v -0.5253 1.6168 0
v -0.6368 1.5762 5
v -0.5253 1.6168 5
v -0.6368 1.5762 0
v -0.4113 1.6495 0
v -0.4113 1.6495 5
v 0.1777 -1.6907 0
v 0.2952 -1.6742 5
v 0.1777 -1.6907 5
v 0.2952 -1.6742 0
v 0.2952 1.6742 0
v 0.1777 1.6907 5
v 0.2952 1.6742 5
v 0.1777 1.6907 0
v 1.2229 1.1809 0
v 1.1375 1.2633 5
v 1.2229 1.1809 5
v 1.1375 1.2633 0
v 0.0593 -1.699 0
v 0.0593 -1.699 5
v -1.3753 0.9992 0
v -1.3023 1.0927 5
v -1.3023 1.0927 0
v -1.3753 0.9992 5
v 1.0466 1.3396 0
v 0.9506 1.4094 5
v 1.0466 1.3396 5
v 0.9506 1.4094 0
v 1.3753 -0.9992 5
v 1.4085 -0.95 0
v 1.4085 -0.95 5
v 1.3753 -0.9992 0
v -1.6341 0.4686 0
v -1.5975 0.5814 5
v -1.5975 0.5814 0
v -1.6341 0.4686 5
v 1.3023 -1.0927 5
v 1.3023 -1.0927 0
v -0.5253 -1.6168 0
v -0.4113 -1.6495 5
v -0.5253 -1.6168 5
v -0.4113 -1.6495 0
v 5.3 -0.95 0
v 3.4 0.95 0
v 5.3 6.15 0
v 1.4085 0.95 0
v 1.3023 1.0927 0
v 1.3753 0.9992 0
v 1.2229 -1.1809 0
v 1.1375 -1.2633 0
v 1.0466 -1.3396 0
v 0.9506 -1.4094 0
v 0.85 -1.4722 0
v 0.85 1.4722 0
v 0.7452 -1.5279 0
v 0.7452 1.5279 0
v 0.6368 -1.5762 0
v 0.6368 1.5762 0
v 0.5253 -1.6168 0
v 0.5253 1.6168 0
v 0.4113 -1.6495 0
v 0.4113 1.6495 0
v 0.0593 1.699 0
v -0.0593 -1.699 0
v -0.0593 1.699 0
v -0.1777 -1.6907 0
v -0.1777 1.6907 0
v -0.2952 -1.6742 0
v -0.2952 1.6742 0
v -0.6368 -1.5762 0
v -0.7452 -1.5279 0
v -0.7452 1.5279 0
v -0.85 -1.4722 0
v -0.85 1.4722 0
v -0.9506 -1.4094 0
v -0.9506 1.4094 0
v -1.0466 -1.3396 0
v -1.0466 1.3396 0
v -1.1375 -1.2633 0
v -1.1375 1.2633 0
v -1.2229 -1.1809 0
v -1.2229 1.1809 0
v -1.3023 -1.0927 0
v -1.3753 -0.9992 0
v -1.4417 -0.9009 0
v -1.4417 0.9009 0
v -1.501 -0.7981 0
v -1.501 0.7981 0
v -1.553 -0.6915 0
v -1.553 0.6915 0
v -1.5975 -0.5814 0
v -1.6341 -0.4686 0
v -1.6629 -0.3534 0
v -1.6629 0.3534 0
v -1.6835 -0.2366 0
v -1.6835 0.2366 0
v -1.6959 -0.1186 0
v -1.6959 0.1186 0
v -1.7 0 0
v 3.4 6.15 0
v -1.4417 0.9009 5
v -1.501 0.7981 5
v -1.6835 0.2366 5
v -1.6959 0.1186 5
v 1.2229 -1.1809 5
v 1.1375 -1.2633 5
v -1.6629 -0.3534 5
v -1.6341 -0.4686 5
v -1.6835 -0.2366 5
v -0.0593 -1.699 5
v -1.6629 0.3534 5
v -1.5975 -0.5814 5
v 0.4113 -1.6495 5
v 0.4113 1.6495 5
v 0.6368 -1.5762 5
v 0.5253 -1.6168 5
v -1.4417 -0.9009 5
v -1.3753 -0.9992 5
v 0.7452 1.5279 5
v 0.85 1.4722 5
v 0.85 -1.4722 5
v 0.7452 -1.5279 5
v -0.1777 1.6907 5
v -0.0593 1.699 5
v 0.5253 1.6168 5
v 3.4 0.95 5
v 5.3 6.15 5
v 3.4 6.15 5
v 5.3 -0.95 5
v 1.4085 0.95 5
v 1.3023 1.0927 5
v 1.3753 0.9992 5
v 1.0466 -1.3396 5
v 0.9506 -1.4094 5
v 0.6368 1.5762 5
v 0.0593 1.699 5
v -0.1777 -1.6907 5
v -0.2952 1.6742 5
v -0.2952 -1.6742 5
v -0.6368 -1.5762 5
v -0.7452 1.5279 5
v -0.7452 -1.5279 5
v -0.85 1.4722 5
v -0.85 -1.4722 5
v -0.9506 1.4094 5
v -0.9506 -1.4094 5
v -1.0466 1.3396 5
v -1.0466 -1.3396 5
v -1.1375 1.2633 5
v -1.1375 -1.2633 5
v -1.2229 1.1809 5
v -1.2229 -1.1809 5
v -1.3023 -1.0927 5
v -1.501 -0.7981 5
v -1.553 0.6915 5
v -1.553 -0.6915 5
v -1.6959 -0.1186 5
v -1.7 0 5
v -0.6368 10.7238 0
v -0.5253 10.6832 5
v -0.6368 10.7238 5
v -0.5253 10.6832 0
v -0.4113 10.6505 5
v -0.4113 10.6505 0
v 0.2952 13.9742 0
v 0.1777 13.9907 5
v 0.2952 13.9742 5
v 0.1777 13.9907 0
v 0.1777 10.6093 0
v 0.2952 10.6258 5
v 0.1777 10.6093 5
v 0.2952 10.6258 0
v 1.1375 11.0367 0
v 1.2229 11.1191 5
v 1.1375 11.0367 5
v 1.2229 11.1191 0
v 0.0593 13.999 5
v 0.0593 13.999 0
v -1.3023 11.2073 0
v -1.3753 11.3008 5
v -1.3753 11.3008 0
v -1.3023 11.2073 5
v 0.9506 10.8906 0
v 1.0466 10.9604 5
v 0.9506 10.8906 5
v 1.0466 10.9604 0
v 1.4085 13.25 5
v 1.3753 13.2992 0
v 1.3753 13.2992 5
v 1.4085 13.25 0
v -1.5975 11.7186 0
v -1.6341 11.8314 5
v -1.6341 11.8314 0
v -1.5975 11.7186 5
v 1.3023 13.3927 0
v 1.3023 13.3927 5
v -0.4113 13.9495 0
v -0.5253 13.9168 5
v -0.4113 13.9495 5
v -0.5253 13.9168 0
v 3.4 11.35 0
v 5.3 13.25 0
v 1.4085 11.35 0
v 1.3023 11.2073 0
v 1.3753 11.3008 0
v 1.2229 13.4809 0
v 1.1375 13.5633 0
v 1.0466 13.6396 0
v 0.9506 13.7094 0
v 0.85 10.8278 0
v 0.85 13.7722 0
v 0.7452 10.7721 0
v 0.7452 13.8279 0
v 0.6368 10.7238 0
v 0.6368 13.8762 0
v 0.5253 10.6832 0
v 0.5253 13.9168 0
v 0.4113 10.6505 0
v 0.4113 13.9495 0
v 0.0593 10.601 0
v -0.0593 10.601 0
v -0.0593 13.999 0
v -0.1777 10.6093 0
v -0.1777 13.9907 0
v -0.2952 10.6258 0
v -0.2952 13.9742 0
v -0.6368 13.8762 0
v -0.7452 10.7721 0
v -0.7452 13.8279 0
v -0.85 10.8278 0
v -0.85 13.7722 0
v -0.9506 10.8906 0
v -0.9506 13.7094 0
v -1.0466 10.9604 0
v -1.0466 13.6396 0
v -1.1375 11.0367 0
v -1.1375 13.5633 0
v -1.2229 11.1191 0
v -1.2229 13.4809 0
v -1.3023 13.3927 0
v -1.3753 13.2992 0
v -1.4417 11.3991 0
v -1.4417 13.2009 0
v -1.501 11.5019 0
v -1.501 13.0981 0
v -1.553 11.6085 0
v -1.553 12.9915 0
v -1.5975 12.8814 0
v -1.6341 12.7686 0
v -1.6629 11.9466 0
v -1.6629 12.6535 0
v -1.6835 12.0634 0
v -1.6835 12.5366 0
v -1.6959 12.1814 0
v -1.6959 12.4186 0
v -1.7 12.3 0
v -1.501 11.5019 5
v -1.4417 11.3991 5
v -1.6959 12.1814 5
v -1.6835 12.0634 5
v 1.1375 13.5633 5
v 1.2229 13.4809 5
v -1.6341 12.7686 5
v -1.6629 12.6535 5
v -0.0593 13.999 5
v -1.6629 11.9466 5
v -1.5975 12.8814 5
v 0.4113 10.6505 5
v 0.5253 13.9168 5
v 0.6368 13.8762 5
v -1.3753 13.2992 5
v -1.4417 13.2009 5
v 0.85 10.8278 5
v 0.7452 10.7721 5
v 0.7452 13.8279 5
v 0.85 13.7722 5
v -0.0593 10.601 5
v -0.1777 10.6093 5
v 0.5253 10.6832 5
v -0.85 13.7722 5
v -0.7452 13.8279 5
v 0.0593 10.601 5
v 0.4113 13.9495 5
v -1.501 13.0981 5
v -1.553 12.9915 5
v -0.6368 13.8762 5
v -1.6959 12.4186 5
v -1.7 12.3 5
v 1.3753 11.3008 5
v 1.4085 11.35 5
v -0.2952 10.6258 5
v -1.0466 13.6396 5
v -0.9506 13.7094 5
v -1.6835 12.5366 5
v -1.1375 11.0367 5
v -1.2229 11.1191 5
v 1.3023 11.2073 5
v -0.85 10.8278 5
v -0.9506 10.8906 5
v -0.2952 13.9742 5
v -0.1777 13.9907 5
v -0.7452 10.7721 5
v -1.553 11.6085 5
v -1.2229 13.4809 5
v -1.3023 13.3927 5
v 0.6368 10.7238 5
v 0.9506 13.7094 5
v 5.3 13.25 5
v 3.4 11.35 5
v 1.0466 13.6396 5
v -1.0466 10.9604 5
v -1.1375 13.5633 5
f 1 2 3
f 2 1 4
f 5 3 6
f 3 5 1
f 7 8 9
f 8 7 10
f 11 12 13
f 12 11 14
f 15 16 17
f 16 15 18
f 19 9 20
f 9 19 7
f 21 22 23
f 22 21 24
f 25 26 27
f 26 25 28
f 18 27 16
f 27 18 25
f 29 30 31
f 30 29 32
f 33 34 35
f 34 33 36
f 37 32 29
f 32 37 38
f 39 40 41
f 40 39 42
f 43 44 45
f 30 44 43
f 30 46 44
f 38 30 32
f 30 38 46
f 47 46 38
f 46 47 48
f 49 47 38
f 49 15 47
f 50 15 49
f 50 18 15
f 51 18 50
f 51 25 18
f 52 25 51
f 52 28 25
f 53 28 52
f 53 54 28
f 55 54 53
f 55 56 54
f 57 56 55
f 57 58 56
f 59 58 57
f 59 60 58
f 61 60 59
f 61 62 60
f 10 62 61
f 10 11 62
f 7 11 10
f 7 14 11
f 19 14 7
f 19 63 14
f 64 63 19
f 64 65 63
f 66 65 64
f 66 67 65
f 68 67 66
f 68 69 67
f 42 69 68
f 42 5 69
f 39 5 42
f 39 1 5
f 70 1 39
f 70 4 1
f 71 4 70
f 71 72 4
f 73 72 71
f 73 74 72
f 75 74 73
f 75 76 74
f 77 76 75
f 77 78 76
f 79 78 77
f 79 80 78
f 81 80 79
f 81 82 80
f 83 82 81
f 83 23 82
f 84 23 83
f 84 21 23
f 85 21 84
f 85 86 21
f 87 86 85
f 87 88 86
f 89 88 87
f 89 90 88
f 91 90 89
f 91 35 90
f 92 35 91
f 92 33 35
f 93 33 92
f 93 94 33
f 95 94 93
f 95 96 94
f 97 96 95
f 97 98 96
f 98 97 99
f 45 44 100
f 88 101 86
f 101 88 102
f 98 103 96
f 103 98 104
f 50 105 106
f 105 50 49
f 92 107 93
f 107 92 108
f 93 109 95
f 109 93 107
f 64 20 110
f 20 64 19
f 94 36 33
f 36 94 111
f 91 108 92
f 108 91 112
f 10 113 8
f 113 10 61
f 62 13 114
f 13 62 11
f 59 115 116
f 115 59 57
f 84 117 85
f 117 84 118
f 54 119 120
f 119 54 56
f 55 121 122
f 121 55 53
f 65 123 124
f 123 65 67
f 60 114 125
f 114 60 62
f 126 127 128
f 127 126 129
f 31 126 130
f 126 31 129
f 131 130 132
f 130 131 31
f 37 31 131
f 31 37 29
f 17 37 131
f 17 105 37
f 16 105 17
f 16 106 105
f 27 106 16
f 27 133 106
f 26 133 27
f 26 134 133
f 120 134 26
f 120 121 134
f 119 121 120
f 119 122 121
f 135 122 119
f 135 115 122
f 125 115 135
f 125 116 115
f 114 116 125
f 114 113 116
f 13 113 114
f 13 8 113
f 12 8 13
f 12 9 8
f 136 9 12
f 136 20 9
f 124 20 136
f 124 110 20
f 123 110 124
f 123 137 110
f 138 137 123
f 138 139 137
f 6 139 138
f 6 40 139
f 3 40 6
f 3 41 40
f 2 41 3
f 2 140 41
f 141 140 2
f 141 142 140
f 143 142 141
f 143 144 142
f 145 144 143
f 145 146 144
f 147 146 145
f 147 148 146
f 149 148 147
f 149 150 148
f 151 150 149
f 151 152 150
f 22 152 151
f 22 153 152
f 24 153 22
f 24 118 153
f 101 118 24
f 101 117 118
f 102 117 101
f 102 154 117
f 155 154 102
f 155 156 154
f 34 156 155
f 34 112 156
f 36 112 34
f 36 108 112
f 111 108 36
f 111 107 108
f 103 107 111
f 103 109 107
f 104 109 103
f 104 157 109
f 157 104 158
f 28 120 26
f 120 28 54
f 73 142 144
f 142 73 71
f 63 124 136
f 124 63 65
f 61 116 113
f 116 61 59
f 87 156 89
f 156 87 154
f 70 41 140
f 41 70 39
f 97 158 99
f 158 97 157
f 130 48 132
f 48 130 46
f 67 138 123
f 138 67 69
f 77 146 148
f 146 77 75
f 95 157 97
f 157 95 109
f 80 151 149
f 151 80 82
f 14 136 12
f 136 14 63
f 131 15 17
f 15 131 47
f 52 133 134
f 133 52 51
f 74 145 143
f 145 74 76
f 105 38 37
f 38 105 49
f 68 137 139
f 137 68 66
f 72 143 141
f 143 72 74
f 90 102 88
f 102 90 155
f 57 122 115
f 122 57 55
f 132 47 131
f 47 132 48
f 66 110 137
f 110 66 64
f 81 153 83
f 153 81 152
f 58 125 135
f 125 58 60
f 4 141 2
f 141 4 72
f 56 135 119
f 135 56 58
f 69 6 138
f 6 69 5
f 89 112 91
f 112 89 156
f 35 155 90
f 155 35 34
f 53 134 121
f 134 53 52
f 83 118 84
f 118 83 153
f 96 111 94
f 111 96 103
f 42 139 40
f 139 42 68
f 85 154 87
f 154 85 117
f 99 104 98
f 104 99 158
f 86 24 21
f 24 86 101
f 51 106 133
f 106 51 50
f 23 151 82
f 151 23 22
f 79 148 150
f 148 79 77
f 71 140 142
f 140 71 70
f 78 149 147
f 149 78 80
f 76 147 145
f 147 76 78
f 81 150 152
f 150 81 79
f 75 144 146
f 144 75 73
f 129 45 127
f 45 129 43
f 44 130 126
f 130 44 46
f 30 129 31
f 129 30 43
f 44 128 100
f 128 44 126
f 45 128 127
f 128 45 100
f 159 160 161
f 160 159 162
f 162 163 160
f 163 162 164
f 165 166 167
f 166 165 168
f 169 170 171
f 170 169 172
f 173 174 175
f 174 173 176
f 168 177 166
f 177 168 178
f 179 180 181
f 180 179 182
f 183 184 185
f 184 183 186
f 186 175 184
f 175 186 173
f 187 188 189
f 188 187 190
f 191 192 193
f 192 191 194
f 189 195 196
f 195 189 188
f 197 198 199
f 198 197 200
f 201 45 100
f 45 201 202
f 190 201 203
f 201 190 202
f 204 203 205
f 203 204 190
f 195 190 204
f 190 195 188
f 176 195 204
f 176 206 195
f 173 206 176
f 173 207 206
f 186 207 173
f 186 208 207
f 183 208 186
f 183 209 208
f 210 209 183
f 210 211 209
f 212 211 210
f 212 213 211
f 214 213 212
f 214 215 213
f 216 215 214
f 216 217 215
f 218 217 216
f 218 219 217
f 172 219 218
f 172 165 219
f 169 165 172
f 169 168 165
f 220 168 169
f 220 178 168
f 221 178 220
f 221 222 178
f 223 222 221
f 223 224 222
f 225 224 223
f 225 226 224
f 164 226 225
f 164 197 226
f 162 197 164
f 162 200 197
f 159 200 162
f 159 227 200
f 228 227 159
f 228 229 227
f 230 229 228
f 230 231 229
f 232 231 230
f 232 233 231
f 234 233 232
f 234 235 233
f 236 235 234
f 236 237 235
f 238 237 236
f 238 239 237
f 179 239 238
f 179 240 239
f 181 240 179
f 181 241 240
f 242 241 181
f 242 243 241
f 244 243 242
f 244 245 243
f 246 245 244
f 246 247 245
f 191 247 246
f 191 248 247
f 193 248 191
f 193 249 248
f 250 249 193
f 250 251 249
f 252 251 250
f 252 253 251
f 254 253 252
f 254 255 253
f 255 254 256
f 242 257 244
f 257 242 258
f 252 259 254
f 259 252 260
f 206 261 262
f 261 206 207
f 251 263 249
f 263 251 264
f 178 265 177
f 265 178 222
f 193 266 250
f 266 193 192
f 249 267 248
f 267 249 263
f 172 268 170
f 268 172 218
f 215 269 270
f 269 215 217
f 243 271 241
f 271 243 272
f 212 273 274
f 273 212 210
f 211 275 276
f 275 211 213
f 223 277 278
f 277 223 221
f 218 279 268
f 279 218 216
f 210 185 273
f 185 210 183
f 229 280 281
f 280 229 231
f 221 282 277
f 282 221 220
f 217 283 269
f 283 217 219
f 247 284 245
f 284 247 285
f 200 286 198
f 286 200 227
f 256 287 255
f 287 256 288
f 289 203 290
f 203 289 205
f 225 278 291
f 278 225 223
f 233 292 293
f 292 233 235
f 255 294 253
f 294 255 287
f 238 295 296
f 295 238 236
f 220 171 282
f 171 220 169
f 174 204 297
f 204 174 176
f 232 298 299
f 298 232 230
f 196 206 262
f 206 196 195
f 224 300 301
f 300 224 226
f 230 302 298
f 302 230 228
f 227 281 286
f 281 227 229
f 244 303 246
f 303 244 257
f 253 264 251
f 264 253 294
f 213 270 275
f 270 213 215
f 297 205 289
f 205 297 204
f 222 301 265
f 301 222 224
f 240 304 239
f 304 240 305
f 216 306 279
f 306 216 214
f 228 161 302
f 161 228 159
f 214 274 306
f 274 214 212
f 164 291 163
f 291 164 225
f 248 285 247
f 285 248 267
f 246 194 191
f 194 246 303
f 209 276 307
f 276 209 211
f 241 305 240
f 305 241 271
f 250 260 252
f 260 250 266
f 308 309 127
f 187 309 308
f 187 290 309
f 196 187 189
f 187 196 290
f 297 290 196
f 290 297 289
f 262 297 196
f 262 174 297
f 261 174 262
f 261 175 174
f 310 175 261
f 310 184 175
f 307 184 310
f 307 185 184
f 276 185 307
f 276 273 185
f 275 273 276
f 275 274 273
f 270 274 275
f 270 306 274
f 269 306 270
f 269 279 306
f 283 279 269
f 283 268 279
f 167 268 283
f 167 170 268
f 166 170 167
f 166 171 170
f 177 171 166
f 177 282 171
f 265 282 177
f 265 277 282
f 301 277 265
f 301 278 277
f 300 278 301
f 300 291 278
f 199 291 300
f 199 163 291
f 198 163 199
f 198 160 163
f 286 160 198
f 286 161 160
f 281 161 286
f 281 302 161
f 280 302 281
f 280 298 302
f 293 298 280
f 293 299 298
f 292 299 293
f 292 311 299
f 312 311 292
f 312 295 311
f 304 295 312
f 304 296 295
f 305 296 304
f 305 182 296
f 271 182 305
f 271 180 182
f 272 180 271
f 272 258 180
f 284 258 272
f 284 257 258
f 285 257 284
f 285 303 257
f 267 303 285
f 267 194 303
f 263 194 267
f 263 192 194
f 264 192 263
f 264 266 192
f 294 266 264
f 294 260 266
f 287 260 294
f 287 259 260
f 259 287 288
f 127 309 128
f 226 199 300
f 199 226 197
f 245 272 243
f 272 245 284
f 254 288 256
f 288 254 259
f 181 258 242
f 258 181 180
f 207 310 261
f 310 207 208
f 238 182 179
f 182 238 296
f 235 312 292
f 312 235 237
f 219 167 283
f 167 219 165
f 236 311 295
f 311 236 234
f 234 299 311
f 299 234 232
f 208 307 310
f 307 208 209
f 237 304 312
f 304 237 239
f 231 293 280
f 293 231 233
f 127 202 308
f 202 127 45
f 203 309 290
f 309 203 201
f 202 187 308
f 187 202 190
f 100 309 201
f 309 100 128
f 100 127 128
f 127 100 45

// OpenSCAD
/*
 * Race track connecting part
 *
 * Author: Pavel Rampas
 * Version: 1.0.0 (Changelog is at the bottom)
 * License: CC BY-SA 4.0 [https://creativecommons.org/licenses/by-sa/4.0/]
 * Link: https://github.com/pavelrampas/openscad-models
 *
 * OpenSCAD version: 2021.01
 *
 * Instructions:
 * Set up parameters, render and print.
 *
 * Height is layer.
 * Thickness is perimeter.
 */

// Parameters
//------------------------------------------------------------------------------

$fn = $preview ? 15 : 90;

height = 5;
endDiameter = 3.4;
width = 7;
length = 14.2;
thickness = 1.9;

// Code
//------------------------------------------------------------------------------

_half_part();
translate([0, length - thickness, 0]){
    mirror([0, 1, 0]) {
        _half_part();
    }
}

// Functions
//------------------------------------------------------------------------------

// Modules
//------------------------------------------------------------------------------

// half part of the model
module _half_part() {
    cylinder(h = height, d = endDiameter);
    translate([0, -(thickness / 2), 0]) {
        cube([width - (endDiameter / 2), thickness, height]);
    }
    translate([width - (endDiameter / 2) - thickness, -(thickness / 2), 0]) {
        cube([thickness, length / 2, height]);
    }
}

// Changelog
//------------------------------------------------------------------------------

// [1.0.0]:
// Initial release.
